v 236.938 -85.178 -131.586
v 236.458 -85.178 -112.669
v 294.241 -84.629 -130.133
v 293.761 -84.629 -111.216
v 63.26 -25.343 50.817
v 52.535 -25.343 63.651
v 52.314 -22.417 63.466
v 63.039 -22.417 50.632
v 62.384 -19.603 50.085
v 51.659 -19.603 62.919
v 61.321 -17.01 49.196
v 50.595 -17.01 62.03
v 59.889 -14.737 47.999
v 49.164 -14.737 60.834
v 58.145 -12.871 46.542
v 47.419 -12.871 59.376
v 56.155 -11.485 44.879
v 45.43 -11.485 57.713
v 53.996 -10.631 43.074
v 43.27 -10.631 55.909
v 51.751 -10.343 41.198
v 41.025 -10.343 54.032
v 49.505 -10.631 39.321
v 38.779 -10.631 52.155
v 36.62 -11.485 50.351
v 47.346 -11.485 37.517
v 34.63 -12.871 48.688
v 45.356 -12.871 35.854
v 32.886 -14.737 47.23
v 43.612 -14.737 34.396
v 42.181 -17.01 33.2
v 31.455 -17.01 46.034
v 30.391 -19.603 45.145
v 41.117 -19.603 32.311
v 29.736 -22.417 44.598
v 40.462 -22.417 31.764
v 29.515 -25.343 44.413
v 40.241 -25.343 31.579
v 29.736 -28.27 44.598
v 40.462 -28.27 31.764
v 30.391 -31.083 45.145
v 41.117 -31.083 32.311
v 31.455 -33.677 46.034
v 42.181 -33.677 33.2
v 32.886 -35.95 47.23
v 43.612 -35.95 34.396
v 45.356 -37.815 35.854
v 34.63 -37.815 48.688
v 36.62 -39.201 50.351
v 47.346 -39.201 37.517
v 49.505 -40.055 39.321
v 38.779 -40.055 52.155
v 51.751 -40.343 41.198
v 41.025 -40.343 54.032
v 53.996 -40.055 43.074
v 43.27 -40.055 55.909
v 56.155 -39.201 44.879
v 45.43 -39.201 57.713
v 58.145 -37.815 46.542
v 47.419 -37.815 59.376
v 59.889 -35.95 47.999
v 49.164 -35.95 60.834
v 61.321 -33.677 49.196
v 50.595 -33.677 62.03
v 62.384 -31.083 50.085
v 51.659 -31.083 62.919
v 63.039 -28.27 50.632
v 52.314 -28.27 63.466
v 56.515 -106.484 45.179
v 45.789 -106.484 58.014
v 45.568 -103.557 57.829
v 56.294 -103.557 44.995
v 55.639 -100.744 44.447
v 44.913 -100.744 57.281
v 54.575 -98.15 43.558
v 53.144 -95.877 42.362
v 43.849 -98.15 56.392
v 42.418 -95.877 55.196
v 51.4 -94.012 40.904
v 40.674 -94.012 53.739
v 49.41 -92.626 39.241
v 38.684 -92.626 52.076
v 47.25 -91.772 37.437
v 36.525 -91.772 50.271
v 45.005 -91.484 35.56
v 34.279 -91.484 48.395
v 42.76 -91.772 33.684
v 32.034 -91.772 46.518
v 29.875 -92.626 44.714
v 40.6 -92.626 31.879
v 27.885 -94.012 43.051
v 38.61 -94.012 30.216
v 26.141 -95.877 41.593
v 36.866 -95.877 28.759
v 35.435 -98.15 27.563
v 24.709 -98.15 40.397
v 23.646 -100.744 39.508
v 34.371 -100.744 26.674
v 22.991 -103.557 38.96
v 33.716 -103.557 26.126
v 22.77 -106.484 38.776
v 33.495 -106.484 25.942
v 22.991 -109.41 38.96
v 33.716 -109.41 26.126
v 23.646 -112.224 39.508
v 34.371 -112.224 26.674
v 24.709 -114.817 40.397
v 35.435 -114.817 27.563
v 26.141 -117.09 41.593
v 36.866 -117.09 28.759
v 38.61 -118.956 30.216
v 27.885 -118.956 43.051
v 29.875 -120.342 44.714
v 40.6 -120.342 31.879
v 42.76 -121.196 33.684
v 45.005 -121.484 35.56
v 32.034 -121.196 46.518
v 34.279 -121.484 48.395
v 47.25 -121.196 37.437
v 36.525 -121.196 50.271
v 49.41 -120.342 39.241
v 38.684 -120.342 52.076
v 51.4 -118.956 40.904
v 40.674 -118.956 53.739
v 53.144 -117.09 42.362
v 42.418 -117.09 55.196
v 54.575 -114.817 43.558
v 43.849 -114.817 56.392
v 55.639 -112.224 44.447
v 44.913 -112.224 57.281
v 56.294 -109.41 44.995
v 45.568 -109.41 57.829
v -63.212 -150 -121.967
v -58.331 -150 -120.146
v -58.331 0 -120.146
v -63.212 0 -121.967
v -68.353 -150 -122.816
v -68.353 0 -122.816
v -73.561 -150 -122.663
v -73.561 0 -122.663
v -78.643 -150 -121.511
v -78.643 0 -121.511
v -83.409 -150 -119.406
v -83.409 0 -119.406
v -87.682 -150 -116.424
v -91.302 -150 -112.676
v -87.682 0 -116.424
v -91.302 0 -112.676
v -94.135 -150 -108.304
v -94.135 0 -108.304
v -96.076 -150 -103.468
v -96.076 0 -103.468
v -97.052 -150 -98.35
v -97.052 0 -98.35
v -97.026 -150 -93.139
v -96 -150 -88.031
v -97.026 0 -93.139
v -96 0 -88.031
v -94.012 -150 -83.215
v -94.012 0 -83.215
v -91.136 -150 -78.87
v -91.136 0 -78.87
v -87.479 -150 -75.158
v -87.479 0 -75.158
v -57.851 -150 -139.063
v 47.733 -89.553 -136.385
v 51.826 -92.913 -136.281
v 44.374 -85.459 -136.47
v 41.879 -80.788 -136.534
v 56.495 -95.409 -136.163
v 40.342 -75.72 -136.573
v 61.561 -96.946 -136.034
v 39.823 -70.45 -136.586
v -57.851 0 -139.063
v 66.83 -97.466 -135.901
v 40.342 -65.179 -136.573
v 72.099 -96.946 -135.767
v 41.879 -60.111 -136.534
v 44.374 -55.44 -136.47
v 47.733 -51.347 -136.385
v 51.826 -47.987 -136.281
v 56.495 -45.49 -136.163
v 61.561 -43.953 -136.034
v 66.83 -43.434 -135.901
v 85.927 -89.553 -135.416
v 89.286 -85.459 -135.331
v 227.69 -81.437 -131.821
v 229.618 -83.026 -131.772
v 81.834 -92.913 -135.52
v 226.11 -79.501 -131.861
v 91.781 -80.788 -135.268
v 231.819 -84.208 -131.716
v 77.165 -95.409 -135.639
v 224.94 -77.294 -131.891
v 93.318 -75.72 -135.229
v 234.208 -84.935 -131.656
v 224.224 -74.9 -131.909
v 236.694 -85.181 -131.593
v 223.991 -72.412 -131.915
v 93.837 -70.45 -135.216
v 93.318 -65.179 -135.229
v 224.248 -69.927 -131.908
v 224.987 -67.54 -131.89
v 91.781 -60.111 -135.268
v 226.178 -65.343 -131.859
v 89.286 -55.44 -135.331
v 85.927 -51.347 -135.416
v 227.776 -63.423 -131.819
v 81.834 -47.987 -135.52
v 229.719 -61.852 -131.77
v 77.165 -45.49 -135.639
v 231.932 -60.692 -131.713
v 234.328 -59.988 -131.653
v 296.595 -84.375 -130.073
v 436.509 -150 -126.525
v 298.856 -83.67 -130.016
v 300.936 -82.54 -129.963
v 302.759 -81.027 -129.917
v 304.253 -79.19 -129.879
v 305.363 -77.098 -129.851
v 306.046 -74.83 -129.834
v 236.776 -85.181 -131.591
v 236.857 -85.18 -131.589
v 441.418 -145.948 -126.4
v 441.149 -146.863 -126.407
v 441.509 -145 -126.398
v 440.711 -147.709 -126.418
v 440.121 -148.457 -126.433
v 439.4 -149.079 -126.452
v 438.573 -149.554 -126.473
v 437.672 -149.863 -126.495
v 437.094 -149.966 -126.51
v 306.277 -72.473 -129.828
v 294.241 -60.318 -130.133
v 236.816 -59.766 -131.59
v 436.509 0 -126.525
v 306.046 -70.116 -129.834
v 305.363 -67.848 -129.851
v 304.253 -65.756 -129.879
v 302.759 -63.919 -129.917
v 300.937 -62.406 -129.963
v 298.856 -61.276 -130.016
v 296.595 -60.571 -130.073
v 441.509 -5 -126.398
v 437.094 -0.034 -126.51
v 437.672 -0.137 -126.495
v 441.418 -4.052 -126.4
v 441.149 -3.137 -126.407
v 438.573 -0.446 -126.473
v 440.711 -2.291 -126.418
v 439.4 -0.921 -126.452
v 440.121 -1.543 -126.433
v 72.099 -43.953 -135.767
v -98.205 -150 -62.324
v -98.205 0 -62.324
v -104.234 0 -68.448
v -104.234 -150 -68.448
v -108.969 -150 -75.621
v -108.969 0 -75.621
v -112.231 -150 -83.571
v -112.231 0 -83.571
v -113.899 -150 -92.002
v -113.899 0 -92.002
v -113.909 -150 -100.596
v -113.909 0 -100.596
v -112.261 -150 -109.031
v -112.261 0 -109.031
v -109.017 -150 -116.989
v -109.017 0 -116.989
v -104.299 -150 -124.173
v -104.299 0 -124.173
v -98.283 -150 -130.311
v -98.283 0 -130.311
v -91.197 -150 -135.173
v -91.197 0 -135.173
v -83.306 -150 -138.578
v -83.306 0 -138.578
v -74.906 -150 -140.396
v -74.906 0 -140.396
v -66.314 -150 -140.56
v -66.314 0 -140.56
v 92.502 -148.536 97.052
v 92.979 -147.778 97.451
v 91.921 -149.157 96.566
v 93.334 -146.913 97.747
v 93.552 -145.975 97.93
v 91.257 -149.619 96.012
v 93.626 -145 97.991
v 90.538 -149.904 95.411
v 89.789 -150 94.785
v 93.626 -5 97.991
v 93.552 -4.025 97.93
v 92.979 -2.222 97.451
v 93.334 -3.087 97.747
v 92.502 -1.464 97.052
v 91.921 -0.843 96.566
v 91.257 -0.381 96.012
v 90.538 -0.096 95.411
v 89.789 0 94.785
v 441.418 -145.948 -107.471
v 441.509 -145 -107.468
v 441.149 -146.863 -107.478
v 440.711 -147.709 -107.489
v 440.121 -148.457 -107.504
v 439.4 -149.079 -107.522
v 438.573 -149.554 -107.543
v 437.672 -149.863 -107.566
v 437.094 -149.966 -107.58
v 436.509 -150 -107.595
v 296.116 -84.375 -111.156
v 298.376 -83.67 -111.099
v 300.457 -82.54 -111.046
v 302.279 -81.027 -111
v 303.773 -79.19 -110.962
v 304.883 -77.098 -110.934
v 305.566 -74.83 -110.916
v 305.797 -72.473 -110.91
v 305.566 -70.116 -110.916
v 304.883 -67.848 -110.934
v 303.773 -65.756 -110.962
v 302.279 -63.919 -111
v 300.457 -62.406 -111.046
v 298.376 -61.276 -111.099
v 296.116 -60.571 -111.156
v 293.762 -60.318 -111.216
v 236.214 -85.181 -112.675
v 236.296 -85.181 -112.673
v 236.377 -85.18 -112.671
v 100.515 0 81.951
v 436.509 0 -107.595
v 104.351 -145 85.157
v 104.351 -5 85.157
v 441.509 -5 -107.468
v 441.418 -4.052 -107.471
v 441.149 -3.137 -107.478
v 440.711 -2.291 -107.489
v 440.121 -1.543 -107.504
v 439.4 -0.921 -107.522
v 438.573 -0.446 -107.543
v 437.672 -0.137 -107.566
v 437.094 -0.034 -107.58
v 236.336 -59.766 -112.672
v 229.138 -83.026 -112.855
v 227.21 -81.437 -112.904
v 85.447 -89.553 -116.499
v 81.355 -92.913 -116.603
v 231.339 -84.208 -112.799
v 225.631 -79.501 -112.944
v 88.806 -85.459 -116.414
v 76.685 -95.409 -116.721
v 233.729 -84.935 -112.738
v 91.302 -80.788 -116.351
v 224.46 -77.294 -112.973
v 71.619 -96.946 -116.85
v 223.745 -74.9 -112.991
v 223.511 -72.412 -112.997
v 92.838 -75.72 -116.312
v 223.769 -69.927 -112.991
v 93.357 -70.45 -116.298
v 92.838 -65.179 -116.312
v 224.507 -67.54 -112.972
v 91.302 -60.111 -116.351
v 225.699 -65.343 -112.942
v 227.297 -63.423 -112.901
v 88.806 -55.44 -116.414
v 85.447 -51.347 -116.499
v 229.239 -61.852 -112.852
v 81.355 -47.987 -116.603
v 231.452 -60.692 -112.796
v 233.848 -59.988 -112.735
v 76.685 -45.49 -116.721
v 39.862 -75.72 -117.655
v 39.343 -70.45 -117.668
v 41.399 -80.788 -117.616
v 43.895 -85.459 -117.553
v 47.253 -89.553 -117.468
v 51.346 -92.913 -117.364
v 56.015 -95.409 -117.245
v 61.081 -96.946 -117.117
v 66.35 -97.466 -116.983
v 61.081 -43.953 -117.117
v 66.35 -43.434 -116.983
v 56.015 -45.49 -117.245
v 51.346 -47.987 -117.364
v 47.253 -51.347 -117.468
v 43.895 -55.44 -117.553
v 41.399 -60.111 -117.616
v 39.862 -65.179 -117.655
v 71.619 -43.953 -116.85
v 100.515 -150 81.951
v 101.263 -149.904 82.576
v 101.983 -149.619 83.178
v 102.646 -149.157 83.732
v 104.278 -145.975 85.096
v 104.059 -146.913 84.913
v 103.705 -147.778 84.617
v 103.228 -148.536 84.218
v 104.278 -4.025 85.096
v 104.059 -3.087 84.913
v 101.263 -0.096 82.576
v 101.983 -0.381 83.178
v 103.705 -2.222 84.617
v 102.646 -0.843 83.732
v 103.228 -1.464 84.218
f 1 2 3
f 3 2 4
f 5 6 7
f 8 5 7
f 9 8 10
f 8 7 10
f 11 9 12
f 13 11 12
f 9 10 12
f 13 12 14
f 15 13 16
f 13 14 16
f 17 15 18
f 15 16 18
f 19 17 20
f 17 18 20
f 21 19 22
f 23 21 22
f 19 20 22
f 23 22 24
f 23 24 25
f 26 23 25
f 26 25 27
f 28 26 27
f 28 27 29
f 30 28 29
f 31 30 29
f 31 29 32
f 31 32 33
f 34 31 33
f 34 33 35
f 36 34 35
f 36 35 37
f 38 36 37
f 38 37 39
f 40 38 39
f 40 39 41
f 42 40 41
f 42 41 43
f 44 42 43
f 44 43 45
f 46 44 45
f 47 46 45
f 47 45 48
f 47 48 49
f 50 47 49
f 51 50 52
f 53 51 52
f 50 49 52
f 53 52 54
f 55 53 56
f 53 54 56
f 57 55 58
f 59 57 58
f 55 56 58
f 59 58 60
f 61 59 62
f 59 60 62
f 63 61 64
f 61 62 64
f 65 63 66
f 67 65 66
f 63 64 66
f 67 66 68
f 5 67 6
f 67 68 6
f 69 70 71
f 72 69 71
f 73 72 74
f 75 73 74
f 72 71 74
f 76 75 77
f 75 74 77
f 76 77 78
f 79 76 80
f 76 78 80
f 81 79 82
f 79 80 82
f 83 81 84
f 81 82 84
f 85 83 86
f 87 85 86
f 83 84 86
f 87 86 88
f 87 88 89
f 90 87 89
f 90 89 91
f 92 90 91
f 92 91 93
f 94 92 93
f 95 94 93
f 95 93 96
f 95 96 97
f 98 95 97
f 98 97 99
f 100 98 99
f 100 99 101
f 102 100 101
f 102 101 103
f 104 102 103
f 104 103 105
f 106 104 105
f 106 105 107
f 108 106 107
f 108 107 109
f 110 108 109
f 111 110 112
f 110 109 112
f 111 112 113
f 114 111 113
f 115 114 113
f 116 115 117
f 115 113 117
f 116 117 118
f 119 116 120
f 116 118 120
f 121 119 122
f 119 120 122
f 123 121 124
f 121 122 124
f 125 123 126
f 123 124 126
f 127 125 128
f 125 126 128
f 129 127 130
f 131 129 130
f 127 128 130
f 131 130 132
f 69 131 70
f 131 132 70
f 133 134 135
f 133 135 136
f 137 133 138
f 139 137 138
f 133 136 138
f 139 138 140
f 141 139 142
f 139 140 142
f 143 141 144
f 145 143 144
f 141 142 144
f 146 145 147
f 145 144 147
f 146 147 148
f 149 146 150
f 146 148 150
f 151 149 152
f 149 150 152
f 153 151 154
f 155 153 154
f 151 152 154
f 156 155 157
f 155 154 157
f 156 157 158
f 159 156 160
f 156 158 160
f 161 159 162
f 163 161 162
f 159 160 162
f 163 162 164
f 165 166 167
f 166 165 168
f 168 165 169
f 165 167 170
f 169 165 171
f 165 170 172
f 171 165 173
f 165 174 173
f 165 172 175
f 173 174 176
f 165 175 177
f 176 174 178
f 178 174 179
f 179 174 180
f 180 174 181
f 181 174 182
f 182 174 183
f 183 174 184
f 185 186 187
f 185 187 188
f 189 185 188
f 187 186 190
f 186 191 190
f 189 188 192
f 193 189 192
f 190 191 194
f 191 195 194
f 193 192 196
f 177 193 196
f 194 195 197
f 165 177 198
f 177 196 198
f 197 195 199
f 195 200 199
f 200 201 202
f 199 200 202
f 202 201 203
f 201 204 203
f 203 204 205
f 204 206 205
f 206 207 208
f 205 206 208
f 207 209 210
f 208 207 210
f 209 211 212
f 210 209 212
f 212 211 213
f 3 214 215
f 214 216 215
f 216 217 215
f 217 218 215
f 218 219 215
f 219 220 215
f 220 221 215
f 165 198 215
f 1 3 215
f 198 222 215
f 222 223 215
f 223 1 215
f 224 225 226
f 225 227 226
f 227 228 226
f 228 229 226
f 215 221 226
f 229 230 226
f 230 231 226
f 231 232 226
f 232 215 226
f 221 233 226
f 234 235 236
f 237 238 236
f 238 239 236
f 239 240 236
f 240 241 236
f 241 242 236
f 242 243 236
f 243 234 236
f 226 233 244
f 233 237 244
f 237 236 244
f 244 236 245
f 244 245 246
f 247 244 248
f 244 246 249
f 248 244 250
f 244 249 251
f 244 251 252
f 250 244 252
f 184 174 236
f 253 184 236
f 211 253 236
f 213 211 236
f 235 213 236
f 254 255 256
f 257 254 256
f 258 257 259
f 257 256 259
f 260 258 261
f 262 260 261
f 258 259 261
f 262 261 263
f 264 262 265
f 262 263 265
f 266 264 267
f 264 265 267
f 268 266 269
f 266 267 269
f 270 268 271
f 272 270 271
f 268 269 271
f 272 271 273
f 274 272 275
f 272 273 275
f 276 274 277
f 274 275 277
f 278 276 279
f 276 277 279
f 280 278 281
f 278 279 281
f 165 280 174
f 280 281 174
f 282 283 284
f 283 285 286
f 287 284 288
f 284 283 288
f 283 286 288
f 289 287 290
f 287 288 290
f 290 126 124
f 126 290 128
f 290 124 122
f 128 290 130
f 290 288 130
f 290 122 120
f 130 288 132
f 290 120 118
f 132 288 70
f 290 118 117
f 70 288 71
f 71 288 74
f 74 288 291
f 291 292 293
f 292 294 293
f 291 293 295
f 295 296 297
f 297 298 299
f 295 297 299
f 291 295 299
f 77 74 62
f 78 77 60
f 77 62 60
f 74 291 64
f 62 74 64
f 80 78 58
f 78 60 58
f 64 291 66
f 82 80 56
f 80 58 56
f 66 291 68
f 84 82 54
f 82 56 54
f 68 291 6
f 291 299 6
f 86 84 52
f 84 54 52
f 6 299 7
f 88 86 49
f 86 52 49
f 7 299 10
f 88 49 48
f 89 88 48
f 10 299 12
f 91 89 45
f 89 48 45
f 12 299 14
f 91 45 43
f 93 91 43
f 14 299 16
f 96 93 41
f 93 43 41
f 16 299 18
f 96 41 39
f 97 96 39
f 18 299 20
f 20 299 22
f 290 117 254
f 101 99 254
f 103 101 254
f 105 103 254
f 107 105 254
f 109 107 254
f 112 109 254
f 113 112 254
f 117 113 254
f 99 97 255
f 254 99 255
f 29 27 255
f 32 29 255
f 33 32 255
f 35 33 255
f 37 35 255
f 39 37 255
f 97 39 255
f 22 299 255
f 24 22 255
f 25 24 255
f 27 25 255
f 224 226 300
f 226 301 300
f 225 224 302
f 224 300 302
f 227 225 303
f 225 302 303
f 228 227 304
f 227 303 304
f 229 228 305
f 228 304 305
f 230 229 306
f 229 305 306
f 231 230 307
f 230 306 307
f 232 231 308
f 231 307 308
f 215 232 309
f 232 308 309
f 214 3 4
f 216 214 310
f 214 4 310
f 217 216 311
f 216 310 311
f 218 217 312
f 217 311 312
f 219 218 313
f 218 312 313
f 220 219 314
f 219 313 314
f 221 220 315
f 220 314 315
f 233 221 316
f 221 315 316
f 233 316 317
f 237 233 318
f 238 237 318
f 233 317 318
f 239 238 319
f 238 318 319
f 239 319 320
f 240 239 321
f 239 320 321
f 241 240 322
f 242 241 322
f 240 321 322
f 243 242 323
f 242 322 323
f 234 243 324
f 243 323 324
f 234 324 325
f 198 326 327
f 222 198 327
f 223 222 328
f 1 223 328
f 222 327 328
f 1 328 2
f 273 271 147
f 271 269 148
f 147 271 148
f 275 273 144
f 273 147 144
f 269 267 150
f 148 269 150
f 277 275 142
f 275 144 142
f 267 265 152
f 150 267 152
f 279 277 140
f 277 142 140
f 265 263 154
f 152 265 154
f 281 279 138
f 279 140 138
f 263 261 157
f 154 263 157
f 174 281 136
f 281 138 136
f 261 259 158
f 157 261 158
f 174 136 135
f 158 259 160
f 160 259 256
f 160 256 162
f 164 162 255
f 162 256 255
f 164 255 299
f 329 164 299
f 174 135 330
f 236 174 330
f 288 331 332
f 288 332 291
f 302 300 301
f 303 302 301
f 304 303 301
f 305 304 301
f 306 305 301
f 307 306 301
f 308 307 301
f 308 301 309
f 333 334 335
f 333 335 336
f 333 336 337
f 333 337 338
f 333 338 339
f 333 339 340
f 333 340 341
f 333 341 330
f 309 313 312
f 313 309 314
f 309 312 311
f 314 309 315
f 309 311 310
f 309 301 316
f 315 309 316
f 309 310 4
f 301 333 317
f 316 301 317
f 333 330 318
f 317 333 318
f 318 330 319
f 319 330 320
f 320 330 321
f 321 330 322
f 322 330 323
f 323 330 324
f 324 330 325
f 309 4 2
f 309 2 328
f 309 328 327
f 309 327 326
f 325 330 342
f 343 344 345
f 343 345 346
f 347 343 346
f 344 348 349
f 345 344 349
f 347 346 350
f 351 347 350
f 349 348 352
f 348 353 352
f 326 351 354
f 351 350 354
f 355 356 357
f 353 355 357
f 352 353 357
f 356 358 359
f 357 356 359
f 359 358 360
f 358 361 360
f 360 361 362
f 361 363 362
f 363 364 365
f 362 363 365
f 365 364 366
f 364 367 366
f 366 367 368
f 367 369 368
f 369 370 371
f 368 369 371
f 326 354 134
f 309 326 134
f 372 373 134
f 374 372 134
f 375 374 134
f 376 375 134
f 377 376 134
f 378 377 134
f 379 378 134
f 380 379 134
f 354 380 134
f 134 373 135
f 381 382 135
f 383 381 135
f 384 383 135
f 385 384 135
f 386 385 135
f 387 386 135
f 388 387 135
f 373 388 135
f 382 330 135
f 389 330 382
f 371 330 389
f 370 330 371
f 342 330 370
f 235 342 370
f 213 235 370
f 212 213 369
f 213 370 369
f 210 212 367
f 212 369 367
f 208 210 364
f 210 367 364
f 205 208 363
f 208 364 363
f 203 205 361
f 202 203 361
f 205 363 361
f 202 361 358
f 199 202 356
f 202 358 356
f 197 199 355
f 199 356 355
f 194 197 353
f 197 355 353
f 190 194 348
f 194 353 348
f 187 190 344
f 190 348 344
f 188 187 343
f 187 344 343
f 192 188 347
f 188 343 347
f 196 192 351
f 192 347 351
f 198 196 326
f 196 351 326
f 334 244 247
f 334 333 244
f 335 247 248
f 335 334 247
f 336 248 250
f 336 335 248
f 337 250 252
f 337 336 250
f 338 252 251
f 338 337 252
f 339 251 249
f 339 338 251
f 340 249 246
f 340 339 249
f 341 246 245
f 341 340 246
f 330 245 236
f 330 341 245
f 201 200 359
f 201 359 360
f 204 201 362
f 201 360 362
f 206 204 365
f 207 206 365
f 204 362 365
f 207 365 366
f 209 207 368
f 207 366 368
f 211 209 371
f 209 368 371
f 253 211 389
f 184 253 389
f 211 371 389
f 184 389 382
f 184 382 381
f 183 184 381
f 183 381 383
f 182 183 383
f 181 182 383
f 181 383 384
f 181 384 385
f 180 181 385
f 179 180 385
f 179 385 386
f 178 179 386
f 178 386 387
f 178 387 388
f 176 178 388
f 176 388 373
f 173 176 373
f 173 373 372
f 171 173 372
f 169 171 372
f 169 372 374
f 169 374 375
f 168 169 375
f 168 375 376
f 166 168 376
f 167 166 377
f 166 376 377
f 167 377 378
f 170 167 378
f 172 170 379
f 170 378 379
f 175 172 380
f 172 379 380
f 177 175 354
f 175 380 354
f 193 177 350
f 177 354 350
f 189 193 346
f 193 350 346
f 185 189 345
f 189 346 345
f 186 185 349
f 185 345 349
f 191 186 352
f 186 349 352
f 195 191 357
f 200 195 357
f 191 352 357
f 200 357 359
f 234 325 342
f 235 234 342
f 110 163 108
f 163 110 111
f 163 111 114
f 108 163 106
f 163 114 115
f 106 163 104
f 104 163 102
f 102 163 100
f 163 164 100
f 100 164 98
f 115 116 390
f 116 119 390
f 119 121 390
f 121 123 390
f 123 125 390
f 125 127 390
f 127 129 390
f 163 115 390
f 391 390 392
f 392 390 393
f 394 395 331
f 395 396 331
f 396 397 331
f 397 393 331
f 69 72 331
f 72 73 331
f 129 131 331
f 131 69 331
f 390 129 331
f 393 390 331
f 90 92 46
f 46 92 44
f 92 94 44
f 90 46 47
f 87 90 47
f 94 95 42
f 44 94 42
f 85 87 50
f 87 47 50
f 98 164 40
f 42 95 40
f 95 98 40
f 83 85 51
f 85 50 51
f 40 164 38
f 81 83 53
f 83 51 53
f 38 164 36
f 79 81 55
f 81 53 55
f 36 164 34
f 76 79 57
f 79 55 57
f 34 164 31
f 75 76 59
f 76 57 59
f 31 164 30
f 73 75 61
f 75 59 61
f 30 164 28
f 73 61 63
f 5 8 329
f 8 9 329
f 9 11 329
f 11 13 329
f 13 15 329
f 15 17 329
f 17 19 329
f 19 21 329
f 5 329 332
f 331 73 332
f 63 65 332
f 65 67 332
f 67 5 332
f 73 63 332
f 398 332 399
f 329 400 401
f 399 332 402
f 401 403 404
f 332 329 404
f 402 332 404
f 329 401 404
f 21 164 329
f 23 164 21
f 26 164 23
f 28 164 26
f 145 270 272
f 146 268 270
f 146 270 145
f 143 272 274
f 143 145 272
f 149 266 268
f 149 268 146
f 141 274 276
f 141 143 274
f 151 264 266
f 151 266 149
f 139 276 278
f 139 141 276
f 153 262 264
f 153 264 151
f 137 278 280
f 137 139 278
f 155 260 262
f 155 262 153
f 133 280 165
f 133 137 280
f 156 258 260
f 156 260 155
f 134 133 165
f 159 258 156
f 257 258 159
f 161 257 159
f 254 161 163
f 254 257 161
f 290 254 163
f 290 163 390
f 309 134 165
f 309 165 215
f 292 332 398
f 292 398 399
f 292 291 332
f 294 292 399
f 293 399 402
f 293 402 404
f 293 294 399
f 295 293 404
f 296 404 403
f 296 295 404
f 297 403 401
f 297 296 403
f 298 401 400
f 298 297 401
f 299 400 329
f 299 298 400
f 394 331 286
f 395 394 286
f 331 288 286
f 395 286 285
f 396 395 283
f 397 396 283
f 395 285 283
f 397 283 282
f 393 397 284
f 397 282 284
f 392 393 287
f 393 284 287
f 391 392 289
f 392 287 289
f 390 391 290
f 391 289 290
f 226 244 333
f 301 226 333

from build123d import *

# Parameters (mm, degrees)
F1_DEPTH = 150
F2_R     = 5
F3_R     = 14.9999953218
F3_R_2   = 15
F4_DEPTH = 25
F5_R     = 27.0158280376
F6_DEPTH = 25


with BuildPart() as f1:
    # F0 (on Front) → F1 (new body)
    with BuildSketch(Plane.XZ):
        Polygon((93.6258085565, 97.991302244), (-98.2046941788, -62.3241936394), (-87.4790228189, -75.1583299641), (104.3514799163, 85.1571659193), align=None)
        with BuildLine():
            Line((-87.4790228189, -75.1583299641), (-98.2046941788, -62.3241936394))
            ThreePointArc((-98.2046941788, -62.3241936394), (-109.0167692981, -116.9894962958), (-57.8507907344, -139.0629853841))
            Line((-57.8507907344, -139.0629853841), (-58.3305805922, -120.1455667615))
            ThreePointArc((-58.3305805922, -120.1455667615), (-92.8244846189, -110.5584473591), (-87.4790228189, -75.1583299641))
        make_face()
        Polygon((-58.3305805922, -120.1455667615), (-57.8507907344, -139.0629853841), (441.5086849726, -126.3980644136), (441.5086849726, -107.4684772011), align=None)
    extrude(amount=F1_DEPTH)

    # F2
    f2_edges = [f1.edges().sort_by_distance(p)[0] for p in [
        (98.988644, -150, 91.574234),
        (98.988644, 0, 91.574234),
        (441.508685, -150, -116.933271),
        (441.508685, 0, -116.933271),
    ]]
    fillet(f2_edges, radius=F2_R)

    # F3 (on face) → F4 (cut)
    with BuildSketch(Plane(origin=(-9.7165371294, 0, 11.6266253123), x_dir=(0.7673220109, 0, 0.6412619835), z_dir=(-0.6412619835, 0, 0.7673220109))):
        with Locations((57.3368984643, -106.4837826855)):
            Circle(F3_R)
        with Locations((66.128025143, -25.343221313)):
            Circle(F3_R_2)
    extrude(amount=-F4_DEPTH, mode=Mode.SUBTRACT)

    # F5 (on face) → F6 (cut)
    with BuildSketch(Plane(origin=(3.0077160605, 0, -118.5898844978), x_dir=(0.9996785311, 0, 0.0253541791), z_dir=(-0.0253541791, 0, 0.9996785311))):
        with Locations((63.3628219366, -70.44968009)):
            Circle(F5_R)
        with BuildLine():
            Line((290.8473328755, -60.3176639156), (233.4038116923, -59.7659925333))
            ThreePointArc((233.4038116923, -59.7659925333), (220.5742240017, -72.4120867419), (233.2817761647, -85.180803869))
            Line((233.2817761647, -85.180803869), (233.5255773105, -85.1784649534))
            Line((233.5255773105, -85.1784649534), (290.8472091458, -84.6285476904))
            ThreePointArc((290.8472091458, -84.6285476904), (302.8865972816, -72.4731670769), (290.8473328755, -60.3176639156))
        make_face()
        with BuildLine():
            Line((233.5255773105, -85.1784649534), (233.2817761647, -85.180803869))
            ThreePointArc((233.2817761647, -85.180803869), (233.4036823471, -85.1802191266), (233.5255773105, -85.1784649534))
        make_face()
    extrude(amount=-F6_DEPTH, mode=Mode.SUBTRACT)


solid = f1.part
